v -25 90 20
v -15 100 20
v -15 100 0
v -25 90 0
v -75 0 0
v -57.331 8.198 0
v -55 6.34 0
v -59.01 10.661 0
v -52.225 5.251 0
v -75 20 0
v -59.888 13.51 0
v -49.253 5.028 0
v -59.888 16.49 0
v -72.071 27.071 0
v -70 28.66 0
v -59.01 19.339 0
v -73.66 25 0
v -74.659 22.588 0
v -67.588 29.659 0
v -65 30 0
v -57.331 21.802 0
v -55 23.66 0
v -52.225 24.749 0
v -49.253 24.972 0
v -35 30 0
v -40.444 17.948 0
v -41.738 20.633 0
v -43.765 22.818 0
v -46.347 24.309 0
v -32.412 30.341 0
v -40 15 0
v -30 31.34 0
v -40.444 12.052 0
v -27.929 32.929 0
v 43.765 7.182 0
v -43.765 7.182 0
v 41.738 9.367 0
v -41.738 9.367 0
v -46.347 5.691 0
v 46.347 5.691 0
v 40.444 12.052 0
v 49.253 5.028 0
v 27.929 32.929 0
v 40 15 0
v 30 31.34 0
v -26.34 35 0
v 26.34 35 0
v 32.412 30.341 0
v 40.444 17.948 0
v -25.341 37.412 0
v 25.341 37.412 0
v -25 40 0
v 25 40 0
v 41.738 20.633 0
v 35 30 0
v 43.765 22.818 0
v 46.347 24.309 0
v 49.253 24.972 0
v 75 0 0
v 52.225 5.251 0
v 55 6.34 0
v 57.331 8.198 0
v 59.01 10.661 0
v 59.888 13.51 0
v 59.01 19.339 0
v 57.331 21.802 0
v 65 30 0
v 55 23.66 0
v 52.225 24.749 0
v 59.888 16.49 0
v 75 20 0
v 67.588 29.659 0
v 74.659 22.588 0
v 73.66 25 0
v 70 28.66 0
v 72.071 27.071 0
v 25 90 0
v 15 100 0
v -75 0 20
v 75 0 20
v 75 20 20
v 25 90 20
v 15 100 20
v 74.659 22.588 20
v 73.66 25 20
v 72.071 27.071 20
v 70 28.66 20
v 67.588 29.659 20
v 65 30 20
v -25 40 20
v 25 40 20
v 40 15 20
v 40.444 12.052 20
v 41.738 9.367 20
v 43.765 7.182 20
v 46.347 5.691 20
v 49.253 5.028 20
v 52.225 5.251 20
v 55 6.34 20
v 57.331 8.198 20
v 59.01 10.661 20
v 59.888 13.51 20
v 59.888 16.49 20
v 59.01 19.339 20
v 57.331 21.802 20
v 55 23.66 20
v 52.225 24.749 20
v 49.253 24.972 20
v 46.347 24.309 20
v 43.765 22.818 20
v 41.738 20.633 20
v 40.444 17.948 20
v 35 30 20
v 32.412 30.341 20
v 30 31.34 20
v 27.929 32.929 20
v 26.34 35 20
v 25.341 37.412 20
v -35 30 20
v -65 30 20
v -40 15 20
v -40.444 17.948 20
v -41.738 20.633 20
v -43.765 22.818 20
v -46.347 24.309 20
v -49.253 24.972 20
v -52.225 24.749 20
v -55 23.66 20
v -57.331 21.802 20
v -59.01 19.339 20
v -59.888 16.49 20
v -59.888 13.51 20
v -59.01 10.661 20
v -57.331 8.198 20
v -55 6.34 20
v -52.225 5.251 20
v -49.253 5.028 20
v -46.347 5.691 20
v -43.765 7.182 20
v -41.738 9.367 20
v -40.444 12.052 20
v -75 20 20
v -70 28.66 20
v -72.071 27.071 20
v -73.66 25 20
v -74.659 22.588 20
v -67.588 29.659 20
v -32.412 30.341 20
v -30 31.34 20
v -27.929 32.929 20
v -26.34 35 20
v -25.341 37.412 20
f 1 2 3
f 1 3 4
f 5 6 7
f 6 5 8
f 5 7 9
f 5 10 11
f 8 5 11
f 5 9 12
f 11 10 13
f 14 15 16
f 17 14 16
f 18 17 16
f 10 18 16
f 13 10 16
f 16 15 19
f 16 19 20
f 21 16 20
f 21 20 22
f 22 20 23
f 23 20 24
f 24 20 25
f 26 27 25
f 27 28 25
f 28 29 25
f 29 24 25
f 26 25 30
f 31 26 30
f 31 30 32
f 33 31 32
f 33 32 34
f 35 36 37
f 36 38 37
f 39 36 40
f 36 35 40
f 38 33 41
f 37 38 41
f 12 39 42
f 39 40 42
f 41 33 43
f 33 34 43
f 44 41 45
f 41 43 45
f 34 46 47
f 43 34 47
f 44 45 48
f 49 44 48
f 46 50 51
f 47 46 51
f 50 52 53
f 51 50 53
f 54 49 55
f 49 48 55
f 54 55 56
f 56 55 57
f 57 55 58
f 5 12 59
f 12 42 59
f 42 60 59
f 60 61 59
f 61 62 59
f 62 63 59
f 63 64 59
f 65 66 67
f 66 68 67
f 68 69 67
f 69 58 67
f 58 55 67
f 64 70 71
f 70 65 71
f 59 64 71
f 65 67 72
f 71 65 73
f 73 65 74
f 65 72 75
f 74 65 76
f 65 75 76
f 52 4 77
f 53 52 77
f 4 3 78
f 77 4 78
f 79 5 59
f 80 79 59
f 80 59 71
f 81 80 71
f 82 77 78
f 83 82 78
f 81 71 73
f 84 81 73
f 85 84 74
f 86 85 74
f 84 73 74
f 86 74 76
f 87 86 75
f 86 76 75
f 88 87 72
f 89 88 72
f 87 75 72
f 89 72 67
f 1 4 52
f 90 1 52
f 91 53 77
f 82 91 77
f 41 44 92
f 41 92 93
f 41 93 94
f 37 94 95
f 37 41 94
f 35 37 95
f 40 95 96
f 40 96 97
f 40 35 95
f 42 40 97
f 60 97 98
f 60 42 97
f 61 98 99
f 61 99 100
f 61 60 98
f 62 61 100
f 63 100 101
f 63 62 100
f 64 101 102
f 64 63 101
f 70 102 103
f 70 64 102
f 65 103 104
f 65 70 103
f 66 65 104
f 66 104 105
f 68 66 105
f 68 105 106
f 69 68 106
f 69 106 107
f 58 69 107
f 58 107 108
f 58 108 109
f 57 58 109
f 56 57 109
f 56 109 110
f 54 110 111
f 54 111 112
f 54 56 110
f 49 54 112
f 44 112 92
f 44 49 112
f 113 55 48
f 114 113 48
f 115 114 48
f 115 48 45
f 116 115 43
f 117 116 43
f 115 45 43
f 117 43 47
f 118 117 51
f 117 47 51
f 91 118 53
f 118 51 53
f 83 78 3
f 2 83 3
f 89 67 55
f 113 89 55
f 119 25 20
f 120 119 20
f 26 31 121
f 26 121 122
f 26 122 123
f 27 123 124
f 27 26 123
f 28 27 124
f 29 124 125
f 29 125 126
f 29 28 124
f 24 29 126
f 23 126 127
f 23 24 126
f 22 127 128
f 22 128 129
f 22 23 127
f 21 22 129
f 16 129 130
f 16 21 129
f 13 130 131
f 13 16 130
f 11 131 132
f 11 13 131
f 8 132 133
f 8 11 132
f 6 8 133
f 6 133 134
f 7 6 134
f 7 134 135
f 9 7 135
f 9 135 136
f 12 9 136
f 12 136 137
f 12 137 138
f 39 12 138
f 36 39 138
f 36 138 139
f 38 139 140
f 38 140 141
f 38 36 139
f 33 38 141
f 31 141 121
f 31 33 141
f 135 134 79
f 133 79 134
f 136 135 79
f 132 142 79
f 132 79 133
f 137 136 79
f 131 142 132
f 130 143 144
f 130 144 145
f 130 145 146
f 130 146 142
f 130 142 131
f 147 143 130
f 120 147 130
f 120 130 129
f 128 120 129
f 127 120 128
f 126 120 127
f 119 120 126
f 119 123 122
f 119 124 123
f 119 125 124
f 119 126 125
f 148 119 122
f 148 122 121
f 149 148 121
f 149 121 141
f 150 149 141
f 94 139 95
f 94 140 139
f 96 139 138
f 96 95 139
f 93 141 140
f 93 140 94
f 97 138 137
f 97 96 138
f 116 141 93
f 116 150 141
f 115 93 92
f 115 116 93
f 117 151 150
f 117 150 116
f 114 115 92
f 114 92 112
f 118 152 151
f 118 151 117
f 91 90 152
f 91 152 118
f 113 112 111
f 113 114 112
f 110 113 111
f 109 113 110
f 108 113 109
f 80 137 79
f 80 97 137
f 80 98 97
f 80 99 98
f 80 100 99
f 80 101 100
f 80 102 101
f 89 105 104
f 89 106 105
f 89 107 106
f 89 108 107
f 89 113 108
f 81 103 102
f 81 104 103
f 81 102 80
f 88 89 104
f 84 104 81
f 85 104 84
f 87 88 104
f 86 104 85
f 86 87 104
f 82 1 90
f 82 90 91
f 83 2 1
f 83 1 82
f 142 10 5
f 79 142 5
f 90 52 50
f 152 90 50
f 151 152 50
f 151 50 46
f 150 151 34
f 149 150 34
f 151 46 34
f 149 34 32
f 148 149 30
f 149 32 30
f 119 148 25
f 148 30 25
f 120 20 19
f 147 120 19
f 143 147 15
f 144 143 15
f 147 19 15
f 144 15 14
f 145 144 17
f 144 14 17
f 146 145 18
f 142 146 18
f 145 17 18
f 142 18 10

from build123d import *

# Parameters (mm, degrees)
SKETCH1_R           = 10
BOSS_EXTRUDE1_DEPTH = 20


with BuildPart() as part:
    # Sketch1 → Boss-Extrude1 (new body)
    with BuildSketch(Plane.XY):
        with BuildLine():
            Line((-75, 0), (75, 0))
            Line((75, 0), (75, 20))
            ThreePointArc((75, 20), (72.071067812, 27.071067812), (65, 30))
            Line((65, 30), (35, 30))
            ThreePointArc((35, 30), (27.928932188, 32.928932188), (25, 40))
            Line((25, 40), (25, 90))
            Line((25, 90), (15, 100))
            Line((15, 100), (-15, 100))
            Line((-15, 100), (-25, 90))
            Line((-25, 90), (-25, 40))
            ThreePointArc((-25, 40), (-27.928932188, 32.928932188), (-35, 30))
            Line((-35, 30), (-65, 30))
            ThreePointArc((-65, 30), (-72.071067812, 27.071067812), (-75, 20))
            Line((-75, 20), (-75, 0))
        make_face()
        with Locations((-50, 15)):
            Circle(SKETCH1_R, mode=Mode.SUBTRACT)
        with Locations(Location((50, 15, 0), (0, 0, 180))):
            Circle(SKETCH1_R, mode=Mode.SUBTRACT)
    extrude(amount=BOSS_EXTRUDE1_DEPTH)


solid = part.part
